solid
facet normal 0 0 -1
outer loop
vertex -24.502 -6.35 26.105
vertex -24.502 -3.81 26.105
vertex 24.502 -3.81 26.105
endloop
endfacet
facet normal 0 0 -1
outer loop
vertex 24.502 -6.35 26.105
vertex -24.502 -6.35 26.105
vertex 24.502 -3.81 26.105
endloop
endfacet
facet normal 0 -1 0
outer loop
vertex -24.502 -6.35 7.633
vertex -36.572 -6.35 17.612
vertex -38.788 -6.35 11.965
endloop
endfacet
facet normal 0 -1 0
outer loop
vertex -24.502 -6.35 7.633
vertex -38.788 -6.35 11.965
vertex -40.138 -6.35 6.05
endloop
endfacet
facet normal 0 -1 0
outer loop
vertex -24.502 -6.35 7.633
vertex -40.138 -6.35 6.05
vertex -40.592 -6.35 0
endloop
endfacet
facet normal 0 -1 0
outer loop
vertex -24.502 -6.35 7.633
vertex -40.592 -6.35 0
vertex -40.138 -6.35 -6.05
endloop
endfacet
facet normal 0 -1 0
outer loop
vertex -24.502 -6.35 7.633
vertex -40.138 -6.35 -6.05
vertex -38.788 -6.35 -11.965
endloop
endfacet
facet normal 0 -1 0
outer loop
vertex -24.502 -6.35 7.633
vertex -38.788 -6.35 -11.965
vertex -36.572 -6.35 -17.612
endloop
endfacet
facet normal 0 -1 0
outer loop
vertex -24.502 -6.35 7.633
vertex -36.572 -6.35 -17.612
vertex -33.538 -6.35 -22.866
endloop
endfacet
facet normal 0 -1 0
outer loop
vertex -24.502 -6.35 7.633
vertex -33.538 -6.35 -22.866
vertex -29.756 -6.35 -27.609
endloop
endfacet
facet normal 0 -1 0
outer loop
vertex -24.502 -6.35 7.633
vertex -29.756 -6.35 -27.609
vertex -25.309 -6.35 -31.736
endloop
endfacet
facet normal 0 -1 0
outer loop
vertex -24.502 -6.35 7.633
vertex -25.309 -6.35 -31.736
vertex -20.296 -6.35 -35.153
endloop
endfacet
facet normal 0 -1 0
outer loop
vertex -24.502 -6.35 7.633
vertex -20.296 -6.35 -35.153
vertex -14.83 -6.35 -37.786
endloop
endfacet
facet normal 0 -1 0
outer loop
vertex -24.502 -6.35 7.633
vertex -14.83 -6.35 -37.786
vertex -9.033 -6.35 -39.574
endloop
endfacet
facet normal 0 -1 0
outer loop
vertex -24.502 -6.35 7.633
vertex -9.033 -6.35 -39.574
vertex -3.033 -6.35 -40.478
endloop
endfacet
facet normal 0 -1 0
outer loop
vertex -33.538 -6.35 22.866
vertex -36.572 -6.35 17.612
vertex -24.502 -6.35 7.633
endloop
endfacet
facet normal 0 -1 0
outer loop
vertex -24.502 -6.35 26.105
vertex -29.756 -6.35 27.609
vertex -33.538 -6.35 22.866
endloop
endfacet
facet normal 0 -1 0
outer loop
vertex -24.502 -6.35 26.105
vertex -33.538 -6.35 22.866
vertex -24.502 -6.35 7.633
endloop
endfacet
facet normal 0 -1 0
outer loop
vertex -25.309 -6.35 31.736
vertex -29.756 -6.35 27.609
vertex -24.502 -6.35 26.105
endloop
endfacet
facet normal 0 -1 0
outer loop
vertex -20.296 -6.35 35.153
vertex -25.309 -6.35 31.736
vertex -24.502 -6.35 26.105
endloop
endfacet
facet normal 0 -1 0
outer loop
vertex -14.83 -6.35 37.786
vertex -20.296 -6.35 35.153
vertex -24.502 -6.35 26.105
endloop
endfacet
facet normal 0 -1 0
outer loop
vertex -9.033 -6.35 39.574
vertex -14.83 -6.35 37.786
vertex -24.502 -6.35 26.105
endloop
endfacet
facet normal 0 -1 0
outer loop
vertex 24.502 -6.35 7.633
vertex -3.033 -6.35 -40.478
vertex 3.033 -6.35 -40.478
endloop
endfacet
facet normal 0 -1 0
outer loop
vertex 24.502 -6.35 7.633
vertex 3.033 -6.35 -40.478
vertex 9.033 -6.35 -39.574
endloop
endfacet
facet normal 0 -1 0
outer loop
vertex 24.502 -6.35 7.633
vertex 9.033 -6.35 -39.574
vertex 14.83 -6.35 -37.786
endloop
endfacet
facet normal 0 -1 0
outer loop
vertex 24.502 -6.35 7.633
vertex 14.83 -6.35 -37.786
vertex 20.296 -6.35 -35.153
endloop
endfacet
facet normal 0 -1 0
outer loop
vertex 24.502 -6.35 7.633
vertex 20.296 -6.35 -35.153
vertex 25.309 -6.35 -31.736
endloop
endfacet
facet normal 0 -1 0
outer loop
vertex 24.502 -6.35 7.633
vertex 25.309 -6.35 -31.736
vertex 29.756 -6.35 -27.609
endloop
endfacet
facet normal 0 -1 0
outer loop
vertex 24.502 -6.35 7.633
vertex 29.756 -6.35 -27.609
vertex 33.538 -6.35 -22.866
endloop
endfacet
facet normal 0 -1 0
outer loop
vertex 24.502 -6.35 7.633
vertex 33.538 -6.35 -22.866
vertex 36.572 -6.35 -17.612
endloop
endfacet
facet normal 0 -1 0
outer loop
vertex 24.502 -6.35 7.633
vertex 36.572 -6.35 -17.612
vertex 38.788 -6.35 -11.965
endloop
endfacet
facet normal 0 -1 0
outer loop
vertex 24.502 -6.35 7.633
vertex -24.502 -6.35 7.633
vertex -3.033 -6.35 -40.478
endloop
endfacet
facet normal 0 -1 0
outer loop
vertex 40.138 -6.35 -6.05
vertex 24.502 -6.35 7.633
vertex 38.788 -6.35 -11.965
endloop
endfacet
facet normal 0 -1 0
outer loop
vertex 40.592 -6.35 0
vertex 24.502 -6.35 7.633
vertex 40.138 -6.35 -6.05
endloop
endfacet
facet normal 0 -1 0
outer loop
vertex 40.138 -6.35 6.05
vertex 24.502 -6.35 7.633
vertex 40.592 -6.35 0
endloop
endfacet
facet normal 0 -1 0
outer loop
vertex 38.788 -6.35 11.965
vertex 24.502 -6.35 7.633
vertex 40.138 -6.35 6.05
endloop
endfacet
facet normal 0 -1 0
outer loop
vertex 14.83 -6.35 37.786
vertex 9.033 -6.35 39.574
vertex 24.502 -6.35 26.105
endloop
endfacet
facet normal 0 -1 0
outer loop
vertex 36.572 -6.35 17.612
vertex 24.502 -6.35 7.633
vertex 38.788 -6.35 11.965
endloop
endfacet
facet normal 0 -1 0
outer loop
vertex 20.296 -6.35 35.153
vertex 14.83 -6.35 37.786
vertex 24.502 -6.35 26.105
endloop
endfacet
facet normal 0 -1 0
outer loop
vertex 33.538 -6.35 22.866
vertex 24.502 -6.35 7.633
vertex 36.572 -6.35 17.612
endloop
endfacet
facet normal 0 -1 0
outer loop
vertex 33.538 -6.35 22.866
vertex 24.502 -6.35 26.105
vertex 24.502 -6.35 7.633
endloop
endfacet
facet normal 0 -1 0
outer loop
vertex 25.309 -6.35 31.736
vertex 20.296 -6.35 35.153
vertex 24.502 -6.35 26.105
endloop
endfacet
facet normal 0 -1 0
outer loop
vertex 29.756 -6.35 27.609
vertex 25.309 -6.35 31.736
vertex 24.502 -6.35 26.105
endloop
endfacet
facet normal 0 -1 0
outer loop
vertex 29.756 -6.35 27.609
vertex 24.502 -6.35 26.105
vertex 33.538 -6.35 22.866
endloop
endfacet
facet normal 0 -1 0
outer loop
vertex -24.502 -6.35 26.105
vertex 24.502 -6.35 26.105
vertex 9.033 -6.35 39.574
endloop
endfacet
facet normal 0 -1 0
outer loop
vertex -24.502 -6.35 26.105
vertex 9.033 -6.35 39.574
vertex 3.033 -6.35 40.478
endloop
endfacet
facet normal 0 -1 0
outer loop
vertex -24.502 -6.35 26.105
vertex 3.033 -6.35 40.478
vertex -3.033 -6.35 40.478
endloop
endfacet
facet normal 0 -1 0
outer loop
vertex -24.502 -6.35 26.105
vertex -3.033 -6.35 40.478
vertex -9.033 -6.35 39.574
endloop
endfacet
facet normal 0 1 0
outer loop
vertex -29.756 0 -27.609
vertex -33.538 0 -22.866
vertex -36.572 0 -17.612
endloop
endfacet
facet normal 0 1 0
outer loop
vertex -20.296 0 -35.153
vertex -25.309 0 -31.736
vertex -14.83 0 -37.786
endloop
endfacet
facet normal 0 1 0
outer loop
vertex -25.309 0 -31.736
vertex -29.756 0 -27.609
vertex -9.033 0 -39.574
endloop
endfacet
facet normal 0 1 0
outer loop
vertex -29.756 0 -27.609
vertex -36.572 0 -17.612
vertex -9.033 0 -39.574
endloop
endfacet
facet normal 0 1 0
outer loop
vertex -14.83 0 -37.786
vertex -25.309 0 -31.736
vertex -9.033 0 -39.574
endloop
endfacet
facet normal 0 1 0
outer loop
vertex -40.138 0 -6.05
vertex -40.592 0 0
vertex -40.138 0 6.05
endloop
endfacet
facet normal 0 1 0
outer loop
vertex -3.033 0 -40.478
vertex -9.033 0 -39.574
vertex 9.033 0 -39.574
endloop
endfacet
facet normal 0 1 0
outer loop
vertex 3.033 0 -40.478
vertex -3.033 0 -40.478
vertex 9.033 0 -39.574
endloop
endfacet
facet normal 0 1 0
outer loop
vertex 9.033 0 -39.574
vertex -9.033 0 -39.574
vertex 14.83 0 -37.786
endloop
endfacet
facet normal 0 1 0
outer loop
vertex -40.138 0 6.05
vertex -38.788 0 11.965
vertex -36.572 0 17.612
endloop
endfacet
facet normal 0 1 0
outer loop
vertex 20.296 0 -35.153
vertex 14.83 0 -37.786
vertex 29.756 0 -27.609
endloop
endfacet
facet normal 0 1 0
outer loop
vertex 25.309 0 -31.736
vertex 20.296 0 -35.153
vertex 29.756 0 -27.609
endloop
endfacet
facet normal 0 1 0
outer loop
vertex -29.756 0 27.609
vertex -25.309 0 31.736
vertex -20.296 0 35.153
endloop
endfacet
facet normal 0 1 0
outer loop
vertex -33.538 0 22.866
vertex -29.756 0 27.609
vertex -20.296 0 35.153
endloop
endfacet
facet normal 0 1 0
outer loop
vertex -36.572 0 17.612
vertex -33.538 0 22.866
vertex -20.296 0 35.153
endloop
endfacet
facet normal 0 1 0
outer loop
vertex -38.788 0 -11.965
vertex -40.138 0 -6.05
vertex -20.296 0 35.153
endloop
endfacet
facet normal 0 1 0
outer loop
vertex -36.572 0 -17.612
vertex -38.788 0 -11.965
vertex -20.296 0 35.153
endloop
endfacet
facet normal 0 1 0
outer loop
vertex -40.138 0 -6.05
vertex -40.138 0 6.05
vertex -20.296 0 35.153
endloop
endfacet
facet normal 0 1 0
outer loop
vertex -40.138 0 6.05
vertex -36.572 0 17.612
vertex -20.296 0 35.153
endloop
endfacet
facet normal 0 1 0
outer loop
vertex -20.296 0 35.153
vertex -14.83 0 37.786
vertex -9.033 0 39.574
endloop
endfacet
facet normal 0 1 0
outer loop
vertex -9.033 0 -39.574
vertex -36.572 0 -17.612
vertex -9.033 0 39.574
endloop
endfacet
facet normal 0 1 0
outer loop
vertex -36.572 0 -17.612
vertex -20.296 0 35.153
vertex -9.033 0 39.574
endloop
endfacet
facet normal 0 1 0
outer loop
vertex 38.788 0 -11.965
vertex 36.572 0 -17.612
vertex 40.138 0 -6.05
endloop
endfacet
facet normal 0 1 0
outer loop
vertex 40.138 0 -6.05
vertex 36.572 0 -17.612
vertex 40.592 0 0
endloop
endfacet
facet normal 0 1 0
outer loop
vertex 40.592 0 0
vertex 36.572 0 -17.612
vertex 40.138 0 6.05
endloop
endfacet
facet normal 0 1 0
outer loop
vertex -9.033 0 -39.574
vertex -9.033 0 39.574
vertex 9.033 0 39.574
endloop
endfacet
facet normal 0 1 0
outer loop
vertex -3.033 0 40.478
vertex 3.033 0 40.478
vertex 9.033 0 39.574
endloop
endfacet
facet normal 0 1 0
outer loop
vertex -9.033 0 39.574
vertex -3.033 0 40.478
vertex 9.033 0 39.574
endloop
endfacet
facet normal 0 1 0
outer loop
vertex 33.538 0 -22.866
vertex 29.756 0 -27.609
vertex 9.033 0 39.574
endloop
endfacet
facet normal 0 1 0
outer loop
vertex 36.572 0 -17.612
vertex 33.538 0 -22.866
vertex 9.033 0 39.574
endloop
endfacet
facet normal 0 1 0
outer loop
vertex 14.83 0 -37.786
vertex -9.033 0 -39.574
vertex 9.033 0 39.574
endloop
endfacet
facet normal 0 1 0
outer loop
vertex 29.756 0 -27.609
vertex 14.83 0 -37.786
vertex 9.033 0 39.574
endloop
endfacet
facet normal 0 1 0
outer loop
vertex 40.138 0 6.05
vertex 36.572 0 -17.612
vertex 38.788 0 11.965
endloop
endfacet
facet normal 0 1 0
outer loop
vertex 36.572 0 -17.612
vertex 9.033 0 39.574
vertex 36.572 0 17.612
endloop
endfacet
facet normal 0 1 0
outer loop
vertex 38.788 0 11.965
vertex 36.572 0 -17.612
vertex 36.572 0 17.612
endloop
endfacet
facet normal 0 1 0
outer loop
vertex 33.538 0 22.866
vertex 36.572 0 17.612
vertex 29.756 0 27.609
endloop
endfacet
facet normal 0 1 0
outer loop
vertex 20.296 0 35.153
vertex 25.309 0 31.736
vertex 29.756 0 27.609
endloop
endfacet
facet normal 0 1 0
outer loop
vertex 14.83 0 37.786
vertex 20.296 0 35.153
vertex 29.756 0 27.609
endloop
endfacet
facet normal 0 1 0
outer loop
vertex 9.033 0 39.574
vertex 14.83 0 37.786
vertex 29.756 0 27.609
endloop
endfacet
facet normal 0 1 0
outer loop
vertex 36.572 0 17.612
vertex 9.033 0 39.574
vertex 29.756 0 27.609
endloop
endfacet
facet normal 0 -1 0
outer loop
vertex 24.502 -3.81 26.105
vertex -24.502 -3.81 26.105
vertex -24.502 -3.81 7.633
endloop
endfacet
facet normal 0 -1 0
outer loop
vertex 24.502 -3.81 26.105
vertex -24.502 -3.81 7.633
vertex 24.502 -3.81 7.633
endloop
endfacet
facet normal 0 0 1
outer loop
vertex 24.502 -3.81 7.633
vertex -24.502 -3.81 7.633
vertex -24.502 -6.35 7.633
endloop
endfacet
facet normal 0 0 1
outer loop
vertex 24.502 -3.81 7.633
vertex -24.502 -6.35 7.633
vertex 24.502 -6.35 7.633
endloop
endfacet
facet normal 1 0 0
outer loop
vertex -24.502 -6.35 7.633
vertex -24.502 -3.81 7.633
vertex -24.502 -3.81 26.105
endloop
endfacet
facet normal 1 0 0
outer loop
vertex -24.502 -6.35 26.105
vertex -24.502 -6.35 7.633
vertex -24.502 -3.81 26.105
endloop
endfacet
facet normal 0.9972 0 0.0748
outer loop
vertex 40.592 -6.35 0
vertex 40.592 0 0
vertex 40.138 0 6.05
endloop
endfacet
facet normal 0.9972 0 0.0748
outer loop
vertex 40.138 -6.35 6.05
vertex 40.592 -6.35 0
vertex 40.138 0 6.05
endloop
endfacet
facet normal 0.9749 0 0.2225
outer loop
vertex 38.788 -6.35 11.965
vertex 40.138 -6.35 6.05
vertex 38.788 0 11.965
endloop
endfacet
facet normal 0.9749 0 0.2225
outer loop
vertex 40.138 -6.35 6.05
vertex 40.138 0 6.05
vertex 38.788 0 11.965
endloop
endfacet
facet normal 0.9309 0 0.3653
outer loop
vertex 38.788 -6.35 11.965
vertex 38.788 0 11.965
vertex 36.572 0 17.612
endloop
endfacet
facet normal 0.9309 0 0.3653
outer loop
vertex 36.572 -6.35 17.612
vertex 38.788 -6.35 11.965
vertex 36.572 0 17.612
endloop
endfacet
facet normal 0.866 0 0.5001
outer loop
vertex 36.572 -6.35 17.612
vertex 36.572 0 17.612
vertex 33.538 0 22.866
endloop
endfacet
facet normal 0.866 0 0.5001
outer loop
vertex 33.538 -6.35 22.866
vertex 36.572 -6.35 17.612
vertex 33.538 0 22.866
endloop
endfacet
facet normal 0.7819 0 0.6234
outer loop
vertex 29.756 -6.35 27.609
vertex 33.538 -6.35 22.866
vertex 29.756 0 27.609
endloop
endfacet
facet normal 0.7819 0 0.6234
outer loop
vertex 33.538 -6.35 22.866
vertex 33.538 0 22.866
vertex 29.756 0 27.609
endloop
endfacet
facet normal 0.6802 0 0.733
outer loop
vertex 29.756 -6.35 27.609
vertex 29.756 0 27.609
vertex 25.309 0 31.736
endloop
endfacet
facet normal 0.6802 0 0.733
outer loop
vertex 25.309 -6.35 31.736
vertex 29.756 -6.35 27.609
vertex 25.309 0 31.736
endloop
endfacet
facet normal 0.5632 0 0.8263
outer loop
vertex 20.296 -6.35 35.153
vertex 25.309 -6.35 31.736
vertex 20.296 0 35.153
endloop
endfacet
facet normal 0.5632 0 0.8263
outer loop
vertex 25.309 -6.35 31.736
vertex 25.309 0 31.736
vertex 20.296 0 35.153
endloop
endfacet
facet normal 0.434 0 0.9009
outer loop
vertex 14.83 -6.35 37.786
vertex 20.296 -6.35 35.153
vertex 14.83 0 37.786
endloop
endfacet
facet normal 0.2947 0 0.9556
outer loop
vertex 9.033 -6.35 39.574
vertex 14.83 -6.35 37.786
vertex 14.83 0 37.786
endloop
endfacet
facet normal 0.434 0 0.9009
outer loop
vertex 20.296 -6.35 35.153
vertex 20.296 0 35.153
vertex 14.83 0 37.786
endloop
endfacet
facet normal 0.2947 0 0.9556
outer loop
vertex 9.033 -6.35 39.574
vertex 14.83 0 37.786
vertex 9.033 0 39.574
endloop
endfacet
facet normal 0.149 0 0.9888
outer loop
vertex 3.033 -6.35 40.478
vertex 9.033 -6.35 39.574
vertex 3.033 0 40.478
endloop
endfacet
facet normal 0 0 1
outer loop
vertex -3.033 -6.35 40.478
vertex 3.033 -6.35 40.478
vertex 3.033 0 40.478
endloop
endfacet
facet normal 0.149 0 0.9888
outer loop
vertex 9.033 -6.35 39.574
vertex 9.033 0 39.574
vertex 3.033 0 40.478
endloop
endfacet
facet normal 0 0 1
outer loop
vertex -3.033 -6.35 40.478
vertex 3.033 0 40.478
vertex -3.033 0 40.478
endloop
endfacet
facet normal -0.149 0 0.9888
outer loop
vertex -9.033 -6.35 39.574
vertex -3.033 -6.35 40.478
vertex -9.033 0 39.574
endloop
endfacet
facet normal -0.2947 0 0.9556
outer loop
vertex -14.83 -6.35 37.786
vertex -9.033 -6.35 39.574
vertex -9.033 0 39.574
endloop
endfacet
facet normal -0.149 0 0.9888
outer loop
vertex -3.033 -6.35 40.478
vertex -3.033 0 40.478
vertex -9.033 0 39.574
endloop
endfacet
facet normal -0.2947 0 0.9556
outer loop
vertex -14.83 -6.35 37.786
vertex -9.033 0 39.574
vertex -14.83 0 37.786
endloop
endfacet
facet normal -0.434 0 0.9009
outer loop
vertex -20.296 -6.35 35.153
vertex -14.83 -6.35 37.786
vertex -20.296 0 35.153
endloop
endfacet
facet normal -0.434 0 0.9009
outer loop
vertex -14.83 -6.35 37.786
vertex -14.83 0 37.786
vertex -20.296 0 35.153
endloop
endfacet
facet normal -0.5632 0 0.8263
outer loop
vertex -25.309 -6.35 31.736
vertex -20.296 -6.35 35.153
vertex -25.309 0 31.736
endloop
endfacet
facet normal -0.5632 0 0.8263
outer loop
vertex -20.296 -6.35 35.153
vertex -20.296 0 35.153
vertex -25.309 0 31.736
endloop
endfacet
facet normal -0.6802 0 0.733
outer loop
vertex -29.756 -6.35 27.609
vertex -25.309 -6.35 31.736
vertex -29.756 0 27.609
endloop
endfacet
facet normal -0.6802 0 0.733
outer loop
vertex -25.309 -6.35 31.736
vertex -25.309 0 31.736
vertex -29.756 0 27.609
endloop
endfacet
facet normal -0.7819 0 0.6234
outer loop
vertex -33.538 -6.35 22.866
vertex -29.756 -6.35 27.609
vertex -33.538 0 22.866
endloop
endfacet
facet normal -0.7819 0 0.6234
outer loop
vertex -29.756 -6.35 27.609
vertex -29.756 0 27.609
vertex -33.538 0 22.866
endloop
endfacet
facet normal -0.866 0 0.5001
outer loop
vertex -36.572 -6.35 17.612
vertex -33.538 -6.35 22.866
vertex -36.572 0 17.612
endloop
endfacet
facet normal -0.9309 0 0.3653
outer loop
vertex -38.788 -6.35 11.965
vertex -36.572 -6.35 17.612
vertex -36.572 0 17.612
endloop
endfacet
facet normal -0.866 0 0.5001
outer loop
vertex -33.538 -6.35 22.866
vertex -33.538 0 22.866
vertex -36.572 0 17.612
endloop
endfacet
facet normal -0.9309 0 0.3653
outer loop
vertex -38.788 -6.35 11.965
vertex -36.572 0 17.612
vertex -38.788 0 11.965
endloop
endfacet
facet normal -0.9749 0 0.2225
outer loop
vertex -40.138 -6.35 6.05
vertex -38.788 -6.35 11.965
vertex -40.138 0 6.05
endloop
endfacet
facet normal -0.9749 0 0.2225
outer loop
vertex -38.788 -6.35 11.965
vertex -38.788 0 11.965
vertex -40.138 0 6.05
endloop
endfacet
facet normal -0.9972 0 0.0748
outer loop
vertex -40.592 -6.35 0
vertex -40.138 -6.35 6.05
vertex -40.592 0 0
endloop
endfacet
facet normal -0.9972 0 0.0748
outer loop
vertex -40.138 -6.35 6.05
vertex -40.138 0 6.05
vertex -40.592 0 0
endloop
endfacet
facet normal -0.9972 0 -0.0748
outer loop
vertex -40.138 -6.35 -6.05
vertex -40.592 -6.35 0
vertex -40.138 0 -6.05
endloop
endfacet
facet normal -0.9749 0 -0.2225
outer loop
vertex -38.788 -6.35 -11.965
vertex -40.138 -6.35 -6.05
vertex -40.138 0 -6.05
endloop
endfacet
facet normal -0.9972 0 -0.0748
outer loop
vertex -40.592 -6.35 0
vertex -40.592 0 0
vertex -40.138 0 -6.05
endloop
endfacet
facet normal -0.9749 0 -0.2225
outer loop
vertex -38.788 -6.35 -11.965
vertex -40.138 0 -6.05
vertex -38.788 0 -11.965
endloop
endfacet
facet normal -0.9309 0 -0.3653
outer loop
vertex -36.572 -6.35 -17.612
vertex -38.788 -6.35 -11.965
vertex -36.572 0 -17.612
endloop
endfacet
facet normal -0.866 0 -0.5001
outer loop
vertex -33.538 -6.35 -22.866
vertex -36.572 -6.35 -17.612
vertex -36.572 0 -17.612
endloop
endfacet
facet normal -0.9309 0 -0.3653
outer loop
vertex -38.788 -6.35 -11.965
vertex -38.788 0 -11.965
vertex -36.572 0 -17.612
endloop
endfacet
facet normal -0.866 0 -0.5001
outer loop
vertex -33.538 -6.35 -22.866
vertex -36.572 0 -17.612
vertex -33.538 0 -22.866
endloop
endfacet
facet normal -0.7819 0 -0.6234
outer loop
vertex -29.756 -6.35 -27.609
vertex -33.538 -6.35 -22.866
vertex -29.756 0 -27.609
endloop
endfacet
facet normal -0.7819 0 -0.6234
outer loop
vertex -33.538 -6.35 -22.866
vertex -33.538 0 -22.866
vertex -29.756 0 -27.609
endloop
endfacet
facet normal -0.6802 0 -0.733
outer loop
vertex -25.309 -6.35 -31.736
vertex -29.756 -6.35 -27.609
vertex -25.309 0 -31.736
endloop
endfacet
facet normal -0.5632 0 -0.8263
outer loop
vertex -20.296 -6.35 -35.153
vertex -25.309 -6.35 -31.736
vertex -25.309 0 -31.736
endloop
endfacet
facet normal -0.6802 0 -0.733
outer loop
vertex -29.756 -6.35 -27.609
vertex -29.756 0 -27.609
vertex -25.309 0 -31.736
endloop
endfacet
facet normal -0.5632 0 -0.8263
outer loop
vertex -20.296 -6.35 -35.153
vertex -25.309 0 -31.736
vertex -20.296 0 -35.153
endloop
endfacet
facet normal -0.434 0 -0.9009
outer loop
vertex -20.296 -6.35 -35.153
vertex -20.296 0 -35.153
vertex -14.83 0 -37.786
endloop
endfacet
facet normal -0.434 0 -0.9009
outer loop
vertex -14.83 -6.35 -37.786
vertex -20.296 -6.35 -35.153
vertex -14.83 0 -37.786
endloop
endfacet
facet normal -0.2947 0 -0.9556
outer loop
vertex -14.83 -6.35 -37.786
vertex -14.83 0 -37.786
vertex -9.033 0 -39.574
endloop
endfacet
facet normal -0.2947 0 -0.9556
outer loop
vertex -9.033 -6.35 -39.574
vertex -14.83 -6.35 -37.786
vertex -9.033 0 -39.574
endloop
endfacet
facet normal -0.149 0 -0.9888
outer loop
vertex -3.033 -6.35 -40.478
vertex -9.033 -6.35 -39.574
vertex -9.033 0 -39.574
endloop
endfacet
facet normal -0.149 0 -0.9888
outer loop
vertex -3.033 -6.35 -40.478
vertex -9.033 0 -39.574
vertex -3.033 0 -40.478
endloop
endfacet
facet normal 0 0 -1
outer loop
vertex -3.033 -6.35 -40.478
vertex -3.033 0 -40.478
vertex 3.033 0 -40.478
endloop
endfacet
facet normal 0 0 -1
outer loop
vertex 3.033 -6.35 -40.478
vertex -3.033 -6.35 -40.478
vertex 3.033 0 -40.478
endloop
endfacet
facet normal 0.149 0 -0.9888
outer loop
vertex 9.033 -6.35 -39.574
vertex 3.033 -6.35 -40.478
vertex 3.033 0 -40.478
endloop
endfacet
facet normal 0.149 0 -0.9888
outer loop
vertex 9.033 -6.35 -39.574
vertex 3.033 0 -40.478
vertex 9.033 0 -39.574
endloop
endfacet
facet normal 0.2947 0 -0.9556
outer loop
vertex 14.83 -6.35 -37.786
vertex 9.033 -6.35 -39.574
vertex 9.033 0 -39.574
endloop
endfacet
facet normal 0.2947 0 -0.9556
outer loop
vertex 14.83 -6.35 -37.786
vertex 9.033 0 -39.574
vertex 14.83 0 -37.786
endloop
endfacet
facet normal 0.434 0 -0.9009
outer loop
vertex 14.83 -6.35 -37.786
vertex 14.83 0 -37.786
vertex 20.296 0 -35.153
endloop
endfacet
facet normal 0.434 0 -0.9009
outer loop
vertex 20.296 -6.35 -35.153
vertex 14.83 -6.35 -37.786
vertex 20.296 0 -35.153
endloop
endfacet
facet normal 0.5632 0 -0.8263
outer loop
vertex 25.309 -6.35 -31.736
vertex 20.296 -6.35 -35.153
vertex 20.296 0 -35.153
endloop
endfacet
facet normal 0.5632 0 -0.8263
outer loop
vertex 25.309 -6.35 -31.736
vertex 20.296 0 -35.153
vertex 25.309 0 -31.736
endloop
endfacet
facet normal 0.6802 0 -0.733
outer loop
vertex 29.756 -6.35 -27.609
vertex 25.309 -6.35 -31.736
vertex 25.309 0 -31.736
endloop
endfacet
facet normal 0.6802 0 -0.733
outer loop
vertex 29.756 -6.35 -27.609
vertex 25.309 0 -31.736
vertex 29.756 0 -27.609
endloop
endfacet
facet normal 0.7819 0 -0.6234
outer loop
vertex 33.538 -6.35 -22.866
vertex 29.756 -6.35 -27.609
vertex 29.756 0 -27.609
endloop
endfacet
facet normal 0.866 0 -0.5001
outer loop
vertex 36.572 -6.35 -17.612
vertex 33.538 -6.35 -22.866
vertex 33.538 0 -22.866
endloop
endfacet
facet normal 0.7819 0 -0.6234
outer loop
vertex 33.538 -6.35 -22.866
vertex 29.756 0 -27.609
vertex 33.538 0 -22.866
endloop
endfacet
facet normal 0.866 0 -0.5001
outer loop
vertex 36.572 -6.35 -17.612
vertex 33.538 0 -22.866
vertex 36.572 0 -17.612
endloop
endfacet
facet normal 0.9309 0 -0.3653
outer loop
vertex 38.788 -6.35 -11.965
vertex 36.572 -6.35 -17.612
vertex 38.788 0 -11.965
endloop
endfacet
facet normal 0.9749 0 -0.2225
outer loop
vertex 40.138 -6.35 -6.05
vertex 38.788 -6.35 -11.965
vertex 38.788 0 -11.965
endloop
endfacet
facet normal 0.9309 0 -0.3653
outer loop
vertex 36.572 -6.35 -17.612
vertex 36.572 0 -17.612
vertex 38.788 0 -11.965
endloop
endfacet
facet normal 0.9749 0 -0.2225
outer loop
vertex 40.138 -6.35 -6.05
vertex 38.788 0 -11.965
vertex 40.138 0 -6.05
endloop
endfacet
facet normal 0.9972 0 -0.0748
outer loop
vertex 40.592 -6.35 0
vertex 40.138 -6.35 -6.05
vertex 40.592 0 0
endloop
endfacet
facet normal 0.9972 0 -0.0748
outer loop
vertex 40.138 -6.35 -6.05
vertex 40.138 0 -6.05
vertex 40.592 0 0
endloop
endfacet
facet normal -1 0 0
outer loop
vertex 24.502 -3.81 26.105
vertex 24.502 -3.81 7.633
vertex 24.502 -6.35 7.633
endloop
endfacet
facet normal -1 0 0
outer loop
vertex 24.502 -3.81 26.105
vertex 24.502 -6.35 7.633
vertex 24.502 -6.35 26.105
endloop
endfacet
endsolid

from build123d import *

# Parameters (mm, degrees)
F0_R     = 40.591751
F0_W     = 49.004946
F0_H     = 18.471095
F1_DEPTH = 6.35
F2_DEPTH = 3.81


with BuildPart() as f1:
    # F0 (on Front) → F1 (new body)
    with BuildSketch(Plane.XZ):
        Circle(F0_R)
        with Locations((0, 16.86901)):
            Rectangle(F0_W, F0_H, mode=Mode.SUBTRACT)
    extrude(amount=F1_DEPTH)

    # F0 (on Front) → F2 (join)
    with BuildSketch(Plane.XZ):
        with Locations((0, 16.86901)):
            Rectangle(F0_W, F0_H)
    extrude(amount=F2_DEPTH)


solid = f1.part
